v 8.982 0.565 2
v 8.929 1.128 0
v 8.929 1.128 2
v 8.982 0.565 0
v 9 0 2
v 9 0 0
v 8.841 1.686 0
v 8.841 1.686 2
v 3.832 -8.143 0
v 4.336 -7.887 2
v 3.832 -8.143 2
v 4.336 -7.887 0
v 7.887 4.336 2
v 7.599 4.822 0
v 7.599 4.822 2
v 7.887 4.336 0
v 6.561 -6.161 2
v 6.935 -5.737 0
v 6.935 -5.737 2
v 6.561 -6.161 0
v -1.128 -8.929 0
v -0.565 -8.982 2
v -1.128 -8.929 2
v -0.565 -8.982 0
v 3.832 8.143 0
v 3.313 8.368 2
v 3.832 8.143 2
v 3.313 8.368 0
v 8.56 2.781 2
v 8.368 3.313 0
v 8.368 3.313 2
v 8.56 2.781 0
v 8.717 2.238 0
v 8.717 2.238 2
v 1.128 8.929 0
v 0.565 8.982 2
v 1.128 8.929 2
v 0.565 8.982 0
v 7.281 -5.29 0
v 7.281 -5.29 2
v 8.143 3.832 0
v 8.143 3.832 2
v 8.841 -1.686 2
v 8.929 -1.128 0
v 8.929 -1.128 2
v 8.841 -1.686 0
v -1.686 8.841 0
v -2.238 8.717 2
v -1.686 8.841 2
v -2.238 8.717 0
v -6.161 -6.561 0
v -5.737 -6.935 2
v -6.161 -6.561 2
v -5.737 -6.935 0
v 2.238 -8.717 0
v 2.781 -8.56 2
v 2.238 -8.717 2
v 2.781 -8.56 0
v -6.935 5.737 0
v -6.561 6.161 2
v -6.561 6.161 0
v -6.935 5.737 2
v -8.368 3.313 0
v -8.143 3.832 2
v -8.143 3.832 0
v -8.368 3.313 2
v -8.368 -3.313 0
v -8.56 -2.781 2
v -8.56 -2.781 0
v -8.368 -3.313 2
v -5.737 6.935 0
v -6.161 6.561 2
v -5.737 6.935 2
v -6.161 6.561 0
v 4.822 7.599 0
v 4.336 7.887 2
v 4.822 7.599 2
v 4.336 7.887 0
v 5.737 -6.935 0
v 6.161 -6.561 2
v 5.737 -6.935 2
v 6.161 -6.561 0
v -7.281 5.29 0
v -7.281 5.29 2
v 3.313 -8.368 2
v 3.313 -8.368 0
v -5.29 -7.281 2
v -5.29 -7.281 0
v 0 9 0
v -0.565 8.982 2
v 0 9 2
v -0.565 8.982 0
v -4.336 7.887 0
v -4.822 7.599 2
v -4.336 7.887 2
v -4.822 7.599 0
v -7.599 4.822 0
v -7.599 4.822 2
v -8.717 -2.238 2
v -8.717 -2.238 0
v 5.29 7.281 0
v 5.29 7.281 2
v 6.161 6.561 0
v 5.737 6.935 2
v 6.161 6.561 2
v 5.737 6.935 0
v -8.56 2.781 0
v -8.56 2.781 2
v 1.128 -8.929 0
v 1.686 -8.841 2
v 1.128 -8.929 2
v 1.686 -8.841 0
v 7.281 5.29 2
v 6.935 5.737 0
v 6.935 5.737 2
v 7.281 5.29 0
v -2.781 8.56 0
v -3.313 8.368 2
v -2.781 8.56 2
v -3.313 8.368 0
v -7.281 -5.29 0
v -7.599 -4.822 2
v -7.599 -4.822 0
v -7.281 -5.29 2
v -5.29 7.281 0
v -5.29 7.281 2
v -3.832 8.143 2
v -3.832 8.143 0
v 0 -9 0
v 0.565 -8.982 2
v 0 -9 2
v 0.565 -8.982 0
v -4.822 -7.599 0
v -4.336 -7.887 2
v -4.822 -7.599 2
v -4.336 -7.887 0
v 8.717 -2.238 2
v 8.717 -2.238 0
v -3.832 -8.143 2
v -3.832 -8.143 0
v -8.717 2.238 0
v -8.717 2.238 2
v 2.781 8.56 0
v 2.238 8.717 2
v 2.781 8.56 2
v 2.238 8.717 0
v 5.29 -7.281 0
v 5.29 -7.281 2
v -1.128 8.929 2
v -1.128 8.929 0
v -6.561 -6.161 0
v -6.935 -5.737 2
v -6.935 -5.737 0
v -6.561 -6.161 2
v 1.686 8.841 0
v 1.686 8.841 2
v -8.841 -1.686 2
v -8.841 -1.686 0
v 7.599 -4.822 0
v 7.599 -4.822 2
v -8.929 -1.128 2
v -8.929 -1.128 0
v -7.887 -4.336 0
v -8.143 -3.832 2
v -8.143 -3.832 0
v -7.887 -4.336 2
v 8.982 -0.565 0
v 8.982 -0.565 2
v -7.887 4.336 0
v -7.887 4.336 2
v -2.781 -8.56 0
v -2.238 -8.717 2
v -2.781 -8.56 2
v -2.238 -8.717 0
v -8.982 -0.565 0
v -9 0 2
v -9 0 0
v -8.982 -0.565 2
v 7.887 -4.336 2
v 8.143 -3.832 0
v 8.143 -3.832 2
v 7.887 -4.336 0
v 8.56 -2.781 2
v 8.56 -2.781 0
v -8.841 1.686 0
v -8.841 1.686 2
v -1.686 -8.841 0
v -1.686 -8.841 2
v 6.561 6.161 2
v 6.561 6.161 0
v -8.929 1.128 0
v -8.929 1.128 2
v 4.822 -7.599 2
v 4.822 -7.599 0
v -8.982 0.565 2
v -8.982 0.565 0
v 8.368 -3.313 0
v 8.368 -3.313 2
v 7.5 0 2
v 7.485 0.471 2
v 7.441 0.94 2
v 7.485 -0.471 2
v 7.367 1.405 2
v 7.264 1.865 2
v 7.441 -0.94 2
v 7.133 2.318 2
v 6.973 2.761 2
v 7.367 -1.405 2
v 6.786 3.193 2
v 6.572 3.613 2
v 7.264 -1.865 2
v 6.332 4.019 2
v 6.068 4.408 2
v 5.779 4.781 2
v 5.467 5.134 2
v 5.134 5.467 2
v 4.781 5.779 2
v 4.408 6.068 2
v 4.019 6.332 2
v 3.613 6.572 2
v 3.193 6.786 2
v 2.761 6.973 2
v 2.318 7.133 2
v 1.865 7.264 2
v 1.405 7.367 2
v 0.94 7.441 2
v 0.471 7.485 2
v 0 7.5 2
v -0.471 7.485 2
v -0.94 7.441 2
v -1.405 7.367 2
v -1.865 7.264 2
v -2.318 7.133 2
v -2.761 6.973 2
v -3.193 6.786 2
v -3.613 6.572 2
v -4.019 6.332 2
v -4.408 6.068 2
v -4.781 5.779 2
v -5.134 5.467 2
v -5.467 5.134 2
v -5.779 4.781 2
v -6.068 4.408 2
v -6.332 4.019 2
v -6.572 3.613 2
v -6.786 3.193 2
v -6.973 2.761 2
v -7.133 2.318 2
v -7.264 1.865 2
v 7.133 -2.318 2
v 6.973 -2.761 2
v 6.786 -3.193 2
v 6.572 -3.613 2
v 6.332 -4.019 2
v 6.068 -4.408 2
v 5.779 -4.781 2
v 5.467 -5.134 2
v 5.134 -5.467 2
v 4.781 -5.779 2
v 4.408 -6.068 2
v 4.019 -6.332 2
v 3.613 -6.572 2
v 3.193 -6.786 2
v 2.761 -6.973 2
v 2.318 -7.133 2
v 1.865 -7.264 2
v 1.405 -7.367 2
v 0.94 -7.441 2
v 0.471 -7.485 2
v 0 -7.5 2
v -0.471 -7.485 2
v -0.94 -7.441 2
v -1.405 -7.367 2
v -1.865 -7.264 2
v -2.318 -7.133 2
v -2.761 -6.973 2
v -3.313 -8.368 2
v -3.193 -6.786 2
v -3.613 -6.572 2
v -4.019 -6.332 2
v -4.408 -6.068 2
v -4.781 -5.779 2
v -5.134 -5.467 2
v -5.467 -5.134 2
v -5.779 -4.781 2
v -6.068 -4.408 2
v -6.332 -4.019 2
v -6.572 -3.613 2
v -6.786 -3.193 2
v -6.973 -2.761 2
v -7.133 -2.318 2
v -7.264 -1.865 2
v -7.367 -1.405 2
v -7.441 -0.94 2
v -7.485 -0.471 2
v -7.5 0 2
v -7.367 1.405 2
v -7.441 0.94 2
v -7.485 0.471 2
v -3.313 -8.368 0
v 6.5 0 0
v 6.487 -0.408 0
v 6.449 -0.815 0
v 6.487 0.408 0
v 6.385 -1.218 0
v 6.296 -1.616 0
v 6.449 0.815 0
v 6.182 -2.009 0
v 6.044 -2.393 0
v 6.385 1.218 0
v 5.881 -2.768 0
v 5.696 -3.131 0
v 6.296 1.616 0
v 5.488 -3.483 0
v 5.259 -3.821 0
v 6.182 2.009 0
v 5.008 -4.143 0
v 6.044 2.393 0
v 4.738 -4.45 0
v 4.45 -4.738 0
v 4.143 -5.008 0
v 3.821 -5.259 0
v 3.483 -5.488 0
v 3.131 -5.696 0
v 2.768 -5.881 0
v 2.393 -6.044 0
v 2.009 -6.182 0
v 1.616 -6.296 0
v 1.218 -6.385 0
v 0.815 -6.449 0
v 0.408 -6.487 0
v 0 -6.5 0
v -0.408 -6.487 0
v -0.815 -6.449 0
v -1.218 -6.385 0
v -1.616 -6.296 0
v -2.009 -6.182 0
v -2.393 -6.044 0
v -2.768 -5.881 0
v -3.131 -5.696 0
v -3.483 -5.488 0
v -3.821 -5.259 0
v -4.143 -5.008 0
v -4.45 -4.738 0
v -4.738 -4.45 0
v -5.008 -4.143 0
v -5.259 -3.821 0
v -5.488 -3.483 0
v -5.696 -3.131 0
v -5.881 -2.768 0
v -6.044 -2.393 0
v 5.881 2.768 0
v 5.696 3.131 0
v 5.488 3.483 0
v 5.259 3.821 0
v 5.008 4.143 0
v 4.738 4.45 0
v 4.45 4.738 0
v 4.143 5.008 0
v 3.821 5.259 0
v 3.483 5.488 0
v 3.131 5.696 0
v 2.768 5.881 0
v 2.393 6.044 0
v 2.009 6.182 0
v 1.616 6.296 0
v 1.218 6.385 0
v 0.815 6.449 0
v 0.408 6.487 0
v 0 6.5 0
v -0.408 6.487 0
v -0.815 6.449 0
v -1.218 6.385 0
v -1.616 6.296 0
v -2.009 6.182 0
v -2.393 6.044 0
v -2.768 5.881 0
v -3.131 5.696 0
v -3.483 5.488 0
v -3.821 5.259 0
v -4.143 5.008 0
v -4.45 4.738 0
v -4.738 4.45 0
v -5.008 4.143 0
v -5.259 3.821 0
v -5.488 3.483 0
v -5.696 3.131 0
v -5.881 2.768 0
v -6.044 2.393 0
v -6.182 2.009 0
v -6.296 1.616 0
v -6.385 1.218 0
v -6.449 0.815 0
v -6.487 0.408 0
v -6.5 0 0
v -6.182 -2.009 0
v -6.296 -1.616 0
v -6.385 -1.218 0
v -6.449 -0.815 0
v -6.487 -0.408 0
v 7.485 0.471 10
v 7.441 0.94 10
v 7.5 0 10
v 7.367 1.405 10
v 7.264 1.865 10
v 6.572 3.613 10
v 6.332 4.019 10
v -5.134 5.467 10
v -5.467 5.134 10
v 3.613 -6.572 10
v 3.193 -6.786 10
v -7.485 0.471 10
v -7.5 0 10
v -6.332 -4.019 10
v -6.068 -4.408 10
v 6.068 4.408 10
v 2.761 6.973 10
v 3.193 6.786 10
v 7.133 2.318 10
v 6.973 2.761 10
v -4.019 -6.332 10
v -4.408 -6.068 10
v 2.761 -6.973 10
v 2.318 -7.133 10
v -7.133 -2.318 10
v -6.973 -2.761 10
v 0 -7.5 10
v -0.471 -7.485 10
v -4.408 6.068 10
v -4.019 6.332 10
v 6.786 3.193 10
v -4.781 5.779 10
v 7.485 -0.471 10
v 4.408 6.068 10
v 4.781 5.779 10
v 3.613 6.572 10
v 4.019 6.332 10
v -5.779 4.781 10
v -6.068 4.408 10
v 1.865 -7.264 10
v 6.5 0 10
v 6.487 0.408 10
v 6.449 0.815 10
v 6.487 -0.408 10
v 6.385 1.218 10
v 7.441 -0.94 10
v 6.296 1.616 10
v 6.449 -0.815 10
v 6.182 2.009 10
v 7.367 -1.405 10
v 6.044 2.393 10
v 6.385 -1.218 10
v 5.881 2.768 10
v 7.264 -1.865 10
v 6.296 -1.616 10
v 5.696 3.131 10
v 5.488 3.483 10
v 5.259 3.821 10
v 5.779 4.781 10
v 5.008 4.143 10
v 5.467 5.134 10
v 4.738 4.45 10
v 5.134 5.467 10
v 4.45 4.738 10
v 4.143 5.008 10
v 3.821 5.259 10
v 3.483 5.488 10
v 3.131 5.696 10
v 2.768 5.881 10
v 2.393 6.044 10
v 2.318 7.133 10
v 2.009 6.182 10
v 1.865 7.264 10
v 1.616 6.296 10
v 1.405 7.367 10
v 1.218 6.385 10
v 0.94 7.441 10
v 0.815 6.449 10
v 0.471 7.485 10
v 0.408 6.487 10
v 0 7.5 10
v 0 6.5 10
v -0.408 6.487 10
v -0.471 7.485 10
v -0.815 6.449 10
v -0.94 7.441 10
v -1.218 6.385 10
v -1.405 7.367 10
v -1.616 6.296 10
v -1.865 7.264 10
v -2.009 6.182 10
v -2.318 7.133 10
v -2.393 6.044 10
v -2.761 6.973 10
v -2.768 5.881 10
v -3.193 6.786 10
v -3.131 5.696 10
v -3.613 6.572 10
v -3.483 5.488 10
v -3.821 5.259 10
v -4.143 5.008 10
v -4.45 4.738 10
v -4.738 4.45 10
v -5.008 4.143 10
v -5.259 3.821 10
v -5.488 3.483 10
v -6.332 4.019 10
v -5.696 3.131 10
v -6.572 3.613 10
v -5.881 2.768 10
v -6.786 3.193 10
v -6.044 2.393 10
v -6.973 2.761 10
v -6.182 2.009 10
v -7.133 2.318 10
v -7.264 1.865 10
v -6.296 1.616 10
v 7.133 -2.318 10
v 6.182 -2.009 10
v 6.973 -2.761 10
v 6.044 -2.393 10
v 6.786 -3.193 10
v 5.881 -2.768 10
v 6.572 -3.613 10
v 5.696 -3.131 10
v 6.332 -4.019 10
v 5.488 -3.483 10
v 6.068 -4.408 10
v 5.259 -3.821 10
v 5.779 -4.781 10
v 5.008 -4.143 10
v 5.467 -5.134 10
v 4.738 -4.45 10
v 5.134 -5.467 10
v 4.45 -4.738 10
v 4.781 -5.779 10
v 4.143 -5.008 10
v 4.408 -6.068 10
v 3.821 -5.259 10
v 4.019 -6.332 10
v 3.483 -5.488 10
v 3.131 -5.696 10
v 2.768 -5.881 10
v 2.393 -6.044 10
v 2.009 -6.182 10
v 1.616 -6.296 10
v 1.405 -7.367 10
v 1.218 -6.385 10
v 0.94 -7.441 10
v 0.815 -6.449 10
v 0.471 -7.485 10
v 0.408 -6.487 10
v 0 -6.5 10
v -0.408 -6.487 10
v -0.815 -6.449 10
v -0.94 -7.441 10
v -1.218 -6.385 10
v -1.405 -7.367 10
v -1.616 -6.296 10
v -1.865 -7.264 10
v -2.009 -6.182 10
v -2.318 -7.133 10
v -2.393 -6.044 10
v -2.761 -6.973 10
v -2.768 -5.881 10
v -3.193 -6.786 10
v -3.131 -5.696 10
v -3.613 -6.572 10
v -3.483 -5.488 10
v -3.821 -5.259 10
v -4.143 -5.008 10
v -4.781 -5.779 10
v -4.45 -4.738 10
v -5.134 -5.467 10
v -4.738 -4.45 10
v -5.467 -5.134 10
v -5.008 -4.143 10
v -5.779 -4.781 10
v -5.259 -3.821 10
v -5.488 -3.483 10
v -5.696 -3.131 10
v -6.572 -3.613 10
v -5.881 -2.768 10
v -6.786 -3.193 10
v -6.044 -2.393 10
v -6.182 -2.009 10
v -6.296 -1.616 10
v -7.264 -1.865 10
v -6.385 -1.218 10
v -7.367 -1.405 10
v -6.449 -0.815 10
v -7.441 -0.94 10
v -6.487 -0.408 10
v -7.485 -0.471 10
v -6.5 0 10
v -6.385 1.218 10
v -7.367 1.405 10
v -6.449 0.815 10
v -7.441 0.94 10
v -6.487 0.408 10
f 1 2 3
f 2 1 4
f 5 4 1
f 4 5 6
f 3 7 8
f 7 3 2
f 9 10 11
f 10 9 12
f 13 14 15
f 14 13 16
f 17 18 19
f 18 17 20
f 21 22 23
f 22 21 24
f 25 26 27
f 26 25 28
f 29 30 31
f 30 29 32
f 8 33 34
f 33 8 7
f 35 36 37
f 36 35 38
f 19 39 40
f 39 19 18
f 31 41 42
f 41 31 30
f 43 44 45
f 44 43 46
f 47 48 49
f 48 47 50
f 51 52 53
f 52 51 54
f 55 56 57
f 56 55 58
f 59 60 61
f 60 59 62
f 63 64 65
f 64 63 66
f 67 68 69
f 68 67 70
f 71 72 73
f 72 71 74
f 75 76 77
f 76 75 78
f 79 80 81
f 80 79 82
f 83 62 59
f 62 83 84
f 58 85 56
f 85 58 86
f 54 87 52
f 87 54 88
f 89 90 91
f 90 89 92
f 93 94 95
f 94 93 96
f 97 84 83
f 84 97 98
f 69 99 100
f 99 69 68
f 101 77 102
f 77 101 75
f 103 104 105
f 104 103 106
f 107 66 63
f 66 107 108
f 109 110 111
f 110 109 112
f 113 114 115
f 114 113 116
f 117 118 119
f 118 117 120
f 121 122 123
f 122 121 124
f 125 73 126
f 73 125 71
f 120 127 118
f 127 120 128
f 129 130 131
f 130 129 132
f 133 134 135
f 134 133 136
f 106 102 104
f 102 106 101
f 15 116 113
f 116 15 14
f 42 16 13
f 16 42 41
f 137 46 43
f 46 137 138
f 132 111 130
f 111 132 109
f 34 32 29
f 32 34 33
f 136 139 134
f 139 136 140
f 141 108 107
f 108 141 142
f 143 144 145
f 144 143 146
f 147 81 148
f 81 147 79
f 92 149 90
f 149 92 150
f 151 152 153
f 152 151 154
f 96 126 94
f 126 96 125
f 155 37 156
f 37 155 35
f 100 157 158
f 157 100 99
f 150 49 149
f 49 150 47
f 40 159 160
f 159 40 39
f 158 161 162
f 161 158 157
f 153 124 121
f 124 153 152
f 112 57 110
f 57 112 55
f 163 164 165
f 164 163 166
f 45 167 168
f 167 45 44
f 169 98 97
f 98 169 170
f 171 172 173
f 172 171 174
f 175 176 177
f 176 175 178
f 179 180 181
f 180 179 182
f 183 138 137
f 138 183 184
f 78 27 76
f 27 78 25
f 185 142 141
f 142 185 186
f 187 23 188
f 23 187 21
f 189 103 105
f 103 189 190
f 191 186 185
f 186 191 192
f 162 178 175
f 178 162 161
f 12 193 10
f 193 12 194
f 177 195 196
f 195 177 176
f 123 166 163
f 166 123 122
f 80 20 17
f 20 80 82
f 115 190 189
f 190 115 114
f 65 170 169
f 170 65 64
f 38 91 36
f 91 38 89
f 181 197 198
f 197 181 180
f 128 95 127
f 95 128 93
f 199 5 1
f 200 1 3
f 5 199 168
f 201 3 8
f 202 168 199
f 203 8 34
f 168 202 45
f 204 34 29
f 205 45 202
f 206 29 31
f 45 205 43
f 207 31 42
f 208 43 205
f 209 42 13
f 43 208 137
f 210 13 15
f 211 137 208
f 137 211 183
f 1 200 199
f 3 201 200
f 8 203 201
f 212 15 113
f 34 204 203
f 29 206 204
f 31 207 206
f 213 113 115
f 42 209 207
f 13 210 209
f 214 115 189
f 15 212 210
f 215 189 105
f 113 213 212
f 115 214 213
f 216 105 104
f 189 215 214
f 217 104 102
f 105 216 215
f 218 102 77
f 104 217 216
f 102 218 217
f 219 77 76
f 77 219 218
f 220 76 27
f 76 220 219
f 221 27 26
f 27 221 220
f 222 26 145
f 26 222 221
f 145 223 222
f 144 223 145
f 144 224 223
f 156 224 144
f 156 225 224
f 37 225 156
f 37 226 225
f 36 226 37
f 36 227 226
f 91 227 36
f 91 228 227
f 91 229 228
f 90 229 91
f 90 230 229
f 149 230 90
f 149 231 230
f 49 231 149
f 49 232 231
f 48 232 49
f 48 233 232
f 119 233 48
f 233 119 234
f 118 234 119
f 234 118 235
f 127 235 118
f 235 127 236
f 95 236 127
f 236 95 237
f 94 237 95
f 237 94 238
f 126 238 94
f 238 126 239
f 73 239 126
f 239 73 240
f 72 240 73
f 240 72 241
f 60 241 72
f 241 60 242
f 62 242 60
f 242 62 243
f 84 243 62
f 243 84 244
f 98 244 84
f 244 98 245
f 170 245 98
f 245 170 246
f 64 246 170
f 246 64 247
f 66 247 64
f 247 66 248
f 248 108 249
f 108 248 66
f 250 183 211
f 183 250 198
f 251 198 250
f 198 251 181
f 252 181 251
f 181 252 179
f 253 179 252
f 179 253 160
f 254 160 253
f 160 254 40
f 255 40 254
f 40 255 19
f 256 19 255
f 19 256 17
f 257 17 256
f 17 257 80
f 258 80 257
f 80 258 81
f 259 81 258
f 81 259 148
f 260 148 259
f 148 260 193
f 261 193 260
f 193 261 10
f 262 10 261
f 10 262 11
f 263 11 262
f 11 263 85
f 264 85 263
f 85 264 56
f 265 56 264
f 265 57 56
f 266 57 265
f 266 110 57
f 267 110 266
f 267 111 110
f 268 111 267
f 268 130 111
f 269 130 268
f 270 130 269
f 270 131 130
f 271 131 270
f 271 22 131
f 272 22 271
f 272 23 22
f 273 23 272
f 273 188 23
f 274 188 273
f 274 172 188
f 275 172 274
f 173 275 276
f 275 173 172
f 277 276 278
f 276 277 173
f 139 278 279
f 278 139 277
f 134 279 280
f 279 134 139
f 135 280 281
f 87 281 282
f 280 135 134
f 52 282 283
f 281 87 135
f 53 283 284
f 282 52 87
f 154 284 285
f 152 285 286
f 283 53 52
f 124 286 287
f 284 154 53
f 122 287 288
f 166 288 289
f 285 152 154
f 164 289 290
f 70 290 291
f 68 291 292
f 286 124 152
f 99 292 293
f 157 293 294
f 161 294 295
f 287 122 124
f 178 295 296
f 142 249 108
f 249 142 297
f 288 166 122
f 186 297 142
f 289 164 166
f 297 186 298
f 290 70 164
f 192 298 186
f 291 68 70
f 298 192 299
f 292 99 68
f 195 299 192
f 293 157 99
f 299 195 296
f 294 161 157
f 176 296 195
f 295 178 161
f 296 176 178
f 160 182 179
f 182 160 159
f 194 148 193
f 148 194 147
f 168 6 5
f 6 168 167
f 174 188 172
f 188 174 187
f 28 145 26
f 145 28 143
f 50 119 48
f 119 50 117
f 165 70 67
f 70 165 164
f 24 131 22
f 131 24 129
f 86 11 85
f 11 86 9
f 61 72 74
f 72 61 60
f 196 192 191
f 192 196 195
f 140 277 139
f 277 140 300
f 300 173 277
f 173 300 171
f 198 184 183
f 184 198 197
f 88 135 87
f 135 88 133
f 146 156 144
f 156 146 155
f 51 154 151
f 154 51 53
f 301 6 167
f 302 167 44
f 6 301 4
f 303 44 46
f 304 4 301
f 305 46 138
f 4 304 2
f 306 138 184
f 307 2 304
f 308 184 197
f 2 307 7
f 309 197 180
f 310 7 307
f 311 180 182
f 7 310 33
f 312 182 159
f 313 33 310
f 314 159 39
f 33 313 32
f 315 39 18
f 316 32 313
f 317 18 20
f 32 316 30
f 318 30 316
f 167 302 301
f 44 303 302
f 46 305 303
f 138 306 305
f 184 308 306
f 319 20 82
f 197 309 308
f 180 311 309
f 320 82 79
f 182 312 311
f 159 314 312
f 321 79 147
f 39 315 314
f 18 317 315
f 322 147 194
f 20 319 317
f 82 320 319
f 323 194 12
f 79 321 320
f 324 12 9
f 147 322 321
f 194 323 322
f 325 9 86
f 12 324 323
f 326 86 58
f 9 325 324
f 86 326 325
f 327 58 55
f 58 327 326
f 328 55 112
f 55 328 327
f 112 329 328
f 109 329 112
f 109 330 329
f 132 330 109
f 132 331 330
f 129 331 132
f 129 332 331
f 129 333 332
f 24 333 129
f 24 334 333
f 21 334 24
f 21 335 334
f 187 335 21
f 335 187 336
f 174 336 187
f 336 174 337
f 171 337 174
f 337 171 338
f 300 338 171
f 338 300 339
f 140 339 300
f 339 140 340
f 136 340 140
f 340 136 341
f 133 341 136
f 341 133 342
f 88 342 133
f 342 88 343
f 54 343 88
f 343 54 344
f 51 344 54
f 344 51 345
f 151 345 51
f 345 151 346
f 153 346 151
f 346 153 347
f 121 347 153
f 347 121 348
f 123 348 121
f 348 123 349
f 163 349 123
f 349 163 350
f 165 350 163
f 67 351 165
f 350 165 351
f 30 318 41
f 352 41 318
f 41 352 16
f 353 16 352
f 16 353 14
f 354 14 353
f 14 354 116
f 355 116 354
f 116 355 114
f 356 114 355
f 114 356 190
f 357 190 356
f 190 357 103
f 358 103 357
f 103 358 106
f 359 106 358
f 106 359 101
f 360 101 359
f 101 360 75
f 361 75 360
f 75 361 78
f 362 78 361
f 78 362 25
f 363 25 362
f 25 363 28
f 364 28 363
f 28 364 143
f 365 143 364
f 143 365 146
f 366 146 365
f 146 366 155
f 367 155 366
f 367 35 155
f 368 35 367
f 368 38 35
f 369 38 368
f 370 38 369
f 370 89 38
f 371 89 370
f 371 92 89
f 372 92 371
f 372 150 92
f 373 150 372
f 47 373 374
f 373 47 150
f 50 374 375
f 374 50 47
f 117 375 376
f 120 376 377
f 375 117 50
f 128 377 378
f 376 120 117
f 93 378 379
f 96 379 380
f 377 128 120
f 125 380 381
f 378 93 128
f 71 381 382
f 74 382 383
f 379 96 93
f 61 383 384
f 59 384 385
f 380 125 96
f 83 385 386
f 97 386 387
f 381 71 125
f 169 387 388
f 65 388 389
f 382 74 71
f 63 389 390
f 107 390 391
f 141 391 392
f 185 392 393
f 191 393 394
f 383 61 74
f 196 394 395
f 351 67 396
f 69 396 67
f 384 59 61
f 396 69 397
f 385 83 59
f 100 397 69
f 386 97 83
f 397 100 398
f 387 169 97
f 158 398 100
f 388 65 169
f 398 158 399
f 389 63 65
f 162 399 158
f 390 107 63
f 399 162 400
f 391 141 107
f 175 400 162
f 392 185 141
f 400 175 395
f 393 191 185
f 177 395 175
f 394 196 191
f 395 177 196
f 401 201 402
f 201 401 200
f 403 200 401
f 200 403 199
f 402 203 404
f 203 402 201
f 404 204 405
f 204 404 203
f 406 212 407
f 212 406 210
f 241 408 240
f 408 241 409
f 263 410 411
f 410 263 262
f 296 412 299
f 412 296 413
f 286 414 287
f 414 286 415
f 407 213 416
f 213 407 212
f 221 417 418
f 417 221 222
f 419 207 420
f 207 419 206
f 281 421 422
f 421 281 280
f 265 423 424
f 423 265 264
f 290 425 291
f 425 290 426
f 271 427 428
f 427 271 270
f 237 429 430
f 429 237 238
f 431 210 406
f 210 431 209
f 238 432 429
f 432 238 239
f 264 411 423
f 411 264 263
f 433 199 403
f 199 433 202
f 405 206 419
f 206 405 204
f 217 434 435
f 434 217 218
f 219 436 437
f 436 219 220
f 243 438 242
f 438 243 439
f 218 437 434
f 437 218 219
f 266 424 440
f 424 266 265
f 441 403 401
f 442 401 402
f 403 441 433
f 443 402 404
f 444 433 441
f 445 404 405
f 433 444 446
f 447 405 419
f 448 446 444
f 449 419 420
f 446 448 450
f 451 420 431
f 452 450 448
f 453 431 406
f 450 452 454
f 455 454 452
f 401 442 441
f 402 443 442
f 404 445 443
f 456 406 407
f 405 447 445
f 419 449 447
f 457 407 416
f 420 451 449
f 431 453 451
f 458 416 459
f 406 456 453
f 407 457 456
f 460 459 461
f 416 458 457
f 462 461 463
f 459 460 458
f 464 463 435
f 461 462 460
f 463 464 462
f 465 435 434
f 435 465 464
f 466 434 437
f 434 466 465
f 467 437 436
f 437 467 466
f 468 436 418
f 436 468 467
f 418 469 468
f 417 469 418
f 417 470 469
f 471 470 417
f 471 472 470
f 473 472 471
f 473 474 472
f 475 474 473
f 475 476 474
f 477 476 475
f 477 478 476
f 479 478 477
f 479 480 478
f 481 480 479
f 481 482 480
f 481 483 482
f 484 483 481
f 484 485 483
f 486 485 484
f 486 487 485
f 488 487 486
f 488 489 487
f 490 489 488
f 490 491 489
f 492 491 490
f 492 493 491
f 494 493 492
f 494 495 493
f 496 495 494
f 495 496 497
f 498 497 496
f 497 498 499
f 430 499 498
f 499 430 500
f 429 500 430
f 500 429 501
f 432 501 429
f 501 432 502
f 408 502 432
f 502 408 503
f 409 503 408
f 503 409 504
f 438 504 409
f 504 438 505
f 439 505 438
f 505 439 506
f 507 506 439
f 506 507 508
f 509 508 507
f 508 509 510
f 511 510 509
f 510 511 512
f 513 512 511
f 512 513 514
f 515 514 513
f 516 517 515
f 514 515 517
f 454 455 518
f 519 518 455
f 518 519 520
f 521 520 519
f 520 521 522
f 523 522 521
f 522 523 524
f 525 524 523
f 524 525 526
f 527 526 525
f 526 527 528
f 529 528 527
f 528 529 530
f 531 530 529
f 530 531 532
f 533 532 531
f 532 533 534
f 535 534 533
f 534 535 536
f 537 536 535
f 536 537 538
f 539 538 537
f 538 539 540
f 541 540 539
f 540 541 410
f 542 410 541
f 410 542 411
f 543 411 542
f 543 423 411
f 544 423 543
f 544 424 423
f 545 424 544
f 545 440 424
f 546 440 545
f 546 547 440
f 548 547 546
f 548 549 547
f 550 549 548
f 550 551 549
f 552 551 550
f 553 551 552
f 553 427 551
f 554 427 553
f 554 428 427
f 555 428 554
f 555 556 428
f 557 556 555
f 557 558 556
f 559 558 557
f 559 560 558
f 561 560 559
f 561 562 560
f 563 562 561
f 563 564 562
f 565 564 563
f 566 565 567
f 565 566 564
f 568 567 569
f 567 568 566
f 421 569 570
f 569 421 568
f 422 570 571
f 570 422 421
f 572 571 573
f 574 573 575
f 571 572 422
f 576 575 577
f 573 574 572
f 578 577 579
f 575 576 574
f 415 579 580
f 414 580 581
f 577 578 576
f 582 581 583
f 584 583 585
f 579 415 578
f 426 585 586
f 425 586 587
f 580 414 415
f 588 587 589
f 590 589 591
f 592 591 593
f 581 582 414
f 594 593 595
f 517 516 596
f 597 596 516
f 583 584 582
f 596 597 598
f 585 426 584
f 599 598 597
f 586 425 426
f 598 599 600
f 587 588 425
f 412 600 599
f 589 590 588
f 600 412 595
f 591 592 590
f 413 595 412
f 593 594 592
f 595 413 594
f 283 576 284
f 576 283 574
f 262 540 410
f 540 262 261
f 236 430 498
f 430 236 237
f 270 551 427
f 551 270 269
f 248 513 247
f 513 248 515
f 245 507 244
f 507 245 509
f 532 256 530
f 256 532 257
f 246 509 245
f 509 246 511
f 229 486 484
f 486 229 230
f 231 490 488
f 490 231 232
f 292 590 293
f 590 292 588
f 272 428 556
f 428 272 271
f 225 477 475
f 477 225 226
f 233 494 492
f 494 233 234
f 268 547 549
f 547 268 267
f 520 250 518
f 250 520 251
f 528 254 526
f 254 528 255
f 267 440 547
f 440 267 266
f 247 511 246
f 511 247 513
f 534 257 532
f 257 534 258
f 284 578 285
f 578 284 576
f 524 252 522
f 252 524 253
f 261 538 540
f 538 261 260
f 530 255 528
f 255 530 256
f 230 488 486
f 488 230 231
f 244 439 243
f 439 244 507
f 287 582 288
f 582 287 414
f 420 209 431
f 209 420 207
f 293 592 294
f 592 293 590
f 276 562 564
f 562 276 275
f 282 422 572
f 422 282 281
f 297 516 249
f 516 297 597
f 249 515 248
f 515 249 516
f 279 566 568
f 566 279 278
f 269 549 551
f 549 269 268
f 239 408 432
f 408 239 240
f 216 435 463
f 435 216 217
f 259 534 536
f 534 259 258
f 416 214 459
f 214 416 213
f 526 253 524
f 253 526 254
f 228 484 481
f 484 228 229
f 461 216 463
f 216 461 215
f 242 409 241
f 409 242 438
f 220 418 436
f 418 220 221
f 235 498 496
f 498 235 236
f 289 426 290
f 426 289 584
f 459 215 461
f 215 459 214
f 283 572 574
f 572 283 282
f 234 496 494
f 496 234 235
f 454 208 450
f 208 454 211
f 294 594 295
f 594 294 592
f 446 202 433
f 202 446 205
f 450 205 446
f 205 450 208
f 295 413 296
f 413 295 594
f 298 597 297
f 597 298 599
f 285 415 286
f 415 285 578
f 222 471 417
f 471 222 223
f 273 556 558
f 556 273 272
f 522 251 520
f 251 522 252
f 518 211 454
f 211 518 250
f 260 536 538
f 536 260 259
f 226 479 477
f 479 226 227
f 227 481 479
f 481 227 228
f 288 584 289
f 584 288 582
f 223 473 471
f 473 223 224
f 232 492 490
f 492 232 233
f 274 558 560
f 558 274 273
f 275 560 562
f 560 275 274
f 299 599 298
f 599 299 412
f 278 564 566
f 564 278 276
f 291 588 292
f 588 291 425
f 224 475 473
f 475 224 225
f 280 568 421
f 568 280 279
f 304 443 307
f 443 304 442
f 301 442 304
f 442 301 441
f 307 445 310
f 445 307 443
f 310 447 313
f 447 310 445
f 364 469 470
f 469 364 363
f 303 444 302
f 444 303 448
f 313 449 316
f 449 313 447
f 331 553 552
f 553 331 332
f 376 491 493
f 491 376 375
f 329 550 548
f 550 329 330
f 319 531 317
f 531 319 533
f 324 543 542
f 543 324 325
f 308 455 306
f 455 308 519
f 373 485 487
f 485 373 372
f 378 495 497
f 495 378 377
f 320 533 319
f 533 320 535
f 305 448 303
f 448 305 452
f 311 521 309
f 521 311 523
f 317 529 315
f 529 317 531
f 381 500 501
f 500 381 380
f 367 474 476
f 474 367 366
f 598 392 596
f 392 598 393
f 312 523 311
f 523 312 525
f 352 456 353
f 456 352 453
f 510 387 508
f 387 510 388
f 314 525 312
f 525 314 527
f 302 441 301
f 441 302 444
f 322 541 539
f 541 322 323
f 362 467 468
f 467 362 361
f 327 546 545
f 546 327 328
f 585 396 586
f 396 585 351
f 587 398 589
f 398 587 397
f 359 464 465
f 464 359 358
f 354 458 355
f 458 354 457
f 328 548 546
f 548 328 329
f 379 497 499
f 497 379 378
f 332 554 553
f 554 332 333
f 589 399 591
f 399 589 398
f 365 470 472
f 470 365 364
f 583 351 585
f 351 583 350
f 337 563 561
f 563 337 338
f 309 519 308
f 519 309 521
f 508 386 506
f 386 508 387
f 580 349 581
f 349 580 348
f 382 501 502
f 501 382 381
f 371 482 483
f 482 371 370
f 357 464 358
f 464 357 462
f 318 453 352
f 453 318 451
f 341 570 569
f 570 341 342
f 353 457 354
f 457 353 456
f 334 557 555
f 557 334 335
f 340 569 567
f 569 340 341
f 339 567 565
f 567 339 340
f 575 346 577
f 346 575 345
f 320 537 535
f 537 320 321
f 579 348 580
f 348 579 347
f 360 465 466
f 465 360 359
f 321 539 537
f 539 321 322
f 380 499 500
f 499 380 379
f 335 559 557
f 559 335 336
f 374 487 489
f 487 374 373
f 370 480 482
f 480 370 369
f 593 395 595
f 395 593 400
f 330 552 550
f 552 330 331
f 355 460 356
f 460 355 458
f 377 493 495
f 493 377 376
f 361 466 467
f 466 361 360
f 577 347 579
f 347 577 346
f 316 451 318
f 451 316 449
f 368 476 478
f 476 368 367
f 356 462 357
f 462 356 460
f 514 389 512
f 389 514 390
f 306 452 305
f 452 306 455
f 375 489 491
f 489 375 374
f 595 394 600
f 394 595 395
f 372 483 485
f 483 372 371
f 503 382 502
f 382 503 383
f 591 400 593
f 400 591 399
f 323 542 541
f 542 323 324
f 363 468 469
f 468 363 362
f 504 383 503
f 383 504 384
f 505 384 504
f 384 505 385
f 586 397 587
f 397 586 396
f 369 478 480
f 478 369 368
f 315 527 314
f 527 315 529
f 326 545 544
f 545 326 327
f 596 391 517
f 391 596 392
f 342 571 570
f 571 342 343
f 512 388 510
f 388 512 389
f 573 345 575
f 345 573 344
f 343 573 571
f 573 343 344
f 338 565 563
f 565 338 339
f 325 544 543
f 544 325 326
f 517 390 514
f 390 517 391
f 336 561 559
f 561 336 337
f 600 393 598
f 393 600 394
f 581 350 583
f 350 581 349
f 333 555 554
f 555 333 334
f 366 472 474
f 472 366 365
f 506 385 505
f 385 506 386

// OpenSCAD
OUTER_DIA = 18;
INNER_DIA = 13;
INLET_DIA = 15;
INLET_HEIGHT = 8;
EXTENSION = 2;

$fn = 100;

difference() {
    union() {
        cylinder(d = OUTER_DIA, h = EXTENSION);
        cylinder(d = INLET_DIA, h = INLET_HEIGHT + EXTENSION);
    }

    cylinder(d = INNER_DIA, h = INLET_HEIGHT + EXTENSION);
}
